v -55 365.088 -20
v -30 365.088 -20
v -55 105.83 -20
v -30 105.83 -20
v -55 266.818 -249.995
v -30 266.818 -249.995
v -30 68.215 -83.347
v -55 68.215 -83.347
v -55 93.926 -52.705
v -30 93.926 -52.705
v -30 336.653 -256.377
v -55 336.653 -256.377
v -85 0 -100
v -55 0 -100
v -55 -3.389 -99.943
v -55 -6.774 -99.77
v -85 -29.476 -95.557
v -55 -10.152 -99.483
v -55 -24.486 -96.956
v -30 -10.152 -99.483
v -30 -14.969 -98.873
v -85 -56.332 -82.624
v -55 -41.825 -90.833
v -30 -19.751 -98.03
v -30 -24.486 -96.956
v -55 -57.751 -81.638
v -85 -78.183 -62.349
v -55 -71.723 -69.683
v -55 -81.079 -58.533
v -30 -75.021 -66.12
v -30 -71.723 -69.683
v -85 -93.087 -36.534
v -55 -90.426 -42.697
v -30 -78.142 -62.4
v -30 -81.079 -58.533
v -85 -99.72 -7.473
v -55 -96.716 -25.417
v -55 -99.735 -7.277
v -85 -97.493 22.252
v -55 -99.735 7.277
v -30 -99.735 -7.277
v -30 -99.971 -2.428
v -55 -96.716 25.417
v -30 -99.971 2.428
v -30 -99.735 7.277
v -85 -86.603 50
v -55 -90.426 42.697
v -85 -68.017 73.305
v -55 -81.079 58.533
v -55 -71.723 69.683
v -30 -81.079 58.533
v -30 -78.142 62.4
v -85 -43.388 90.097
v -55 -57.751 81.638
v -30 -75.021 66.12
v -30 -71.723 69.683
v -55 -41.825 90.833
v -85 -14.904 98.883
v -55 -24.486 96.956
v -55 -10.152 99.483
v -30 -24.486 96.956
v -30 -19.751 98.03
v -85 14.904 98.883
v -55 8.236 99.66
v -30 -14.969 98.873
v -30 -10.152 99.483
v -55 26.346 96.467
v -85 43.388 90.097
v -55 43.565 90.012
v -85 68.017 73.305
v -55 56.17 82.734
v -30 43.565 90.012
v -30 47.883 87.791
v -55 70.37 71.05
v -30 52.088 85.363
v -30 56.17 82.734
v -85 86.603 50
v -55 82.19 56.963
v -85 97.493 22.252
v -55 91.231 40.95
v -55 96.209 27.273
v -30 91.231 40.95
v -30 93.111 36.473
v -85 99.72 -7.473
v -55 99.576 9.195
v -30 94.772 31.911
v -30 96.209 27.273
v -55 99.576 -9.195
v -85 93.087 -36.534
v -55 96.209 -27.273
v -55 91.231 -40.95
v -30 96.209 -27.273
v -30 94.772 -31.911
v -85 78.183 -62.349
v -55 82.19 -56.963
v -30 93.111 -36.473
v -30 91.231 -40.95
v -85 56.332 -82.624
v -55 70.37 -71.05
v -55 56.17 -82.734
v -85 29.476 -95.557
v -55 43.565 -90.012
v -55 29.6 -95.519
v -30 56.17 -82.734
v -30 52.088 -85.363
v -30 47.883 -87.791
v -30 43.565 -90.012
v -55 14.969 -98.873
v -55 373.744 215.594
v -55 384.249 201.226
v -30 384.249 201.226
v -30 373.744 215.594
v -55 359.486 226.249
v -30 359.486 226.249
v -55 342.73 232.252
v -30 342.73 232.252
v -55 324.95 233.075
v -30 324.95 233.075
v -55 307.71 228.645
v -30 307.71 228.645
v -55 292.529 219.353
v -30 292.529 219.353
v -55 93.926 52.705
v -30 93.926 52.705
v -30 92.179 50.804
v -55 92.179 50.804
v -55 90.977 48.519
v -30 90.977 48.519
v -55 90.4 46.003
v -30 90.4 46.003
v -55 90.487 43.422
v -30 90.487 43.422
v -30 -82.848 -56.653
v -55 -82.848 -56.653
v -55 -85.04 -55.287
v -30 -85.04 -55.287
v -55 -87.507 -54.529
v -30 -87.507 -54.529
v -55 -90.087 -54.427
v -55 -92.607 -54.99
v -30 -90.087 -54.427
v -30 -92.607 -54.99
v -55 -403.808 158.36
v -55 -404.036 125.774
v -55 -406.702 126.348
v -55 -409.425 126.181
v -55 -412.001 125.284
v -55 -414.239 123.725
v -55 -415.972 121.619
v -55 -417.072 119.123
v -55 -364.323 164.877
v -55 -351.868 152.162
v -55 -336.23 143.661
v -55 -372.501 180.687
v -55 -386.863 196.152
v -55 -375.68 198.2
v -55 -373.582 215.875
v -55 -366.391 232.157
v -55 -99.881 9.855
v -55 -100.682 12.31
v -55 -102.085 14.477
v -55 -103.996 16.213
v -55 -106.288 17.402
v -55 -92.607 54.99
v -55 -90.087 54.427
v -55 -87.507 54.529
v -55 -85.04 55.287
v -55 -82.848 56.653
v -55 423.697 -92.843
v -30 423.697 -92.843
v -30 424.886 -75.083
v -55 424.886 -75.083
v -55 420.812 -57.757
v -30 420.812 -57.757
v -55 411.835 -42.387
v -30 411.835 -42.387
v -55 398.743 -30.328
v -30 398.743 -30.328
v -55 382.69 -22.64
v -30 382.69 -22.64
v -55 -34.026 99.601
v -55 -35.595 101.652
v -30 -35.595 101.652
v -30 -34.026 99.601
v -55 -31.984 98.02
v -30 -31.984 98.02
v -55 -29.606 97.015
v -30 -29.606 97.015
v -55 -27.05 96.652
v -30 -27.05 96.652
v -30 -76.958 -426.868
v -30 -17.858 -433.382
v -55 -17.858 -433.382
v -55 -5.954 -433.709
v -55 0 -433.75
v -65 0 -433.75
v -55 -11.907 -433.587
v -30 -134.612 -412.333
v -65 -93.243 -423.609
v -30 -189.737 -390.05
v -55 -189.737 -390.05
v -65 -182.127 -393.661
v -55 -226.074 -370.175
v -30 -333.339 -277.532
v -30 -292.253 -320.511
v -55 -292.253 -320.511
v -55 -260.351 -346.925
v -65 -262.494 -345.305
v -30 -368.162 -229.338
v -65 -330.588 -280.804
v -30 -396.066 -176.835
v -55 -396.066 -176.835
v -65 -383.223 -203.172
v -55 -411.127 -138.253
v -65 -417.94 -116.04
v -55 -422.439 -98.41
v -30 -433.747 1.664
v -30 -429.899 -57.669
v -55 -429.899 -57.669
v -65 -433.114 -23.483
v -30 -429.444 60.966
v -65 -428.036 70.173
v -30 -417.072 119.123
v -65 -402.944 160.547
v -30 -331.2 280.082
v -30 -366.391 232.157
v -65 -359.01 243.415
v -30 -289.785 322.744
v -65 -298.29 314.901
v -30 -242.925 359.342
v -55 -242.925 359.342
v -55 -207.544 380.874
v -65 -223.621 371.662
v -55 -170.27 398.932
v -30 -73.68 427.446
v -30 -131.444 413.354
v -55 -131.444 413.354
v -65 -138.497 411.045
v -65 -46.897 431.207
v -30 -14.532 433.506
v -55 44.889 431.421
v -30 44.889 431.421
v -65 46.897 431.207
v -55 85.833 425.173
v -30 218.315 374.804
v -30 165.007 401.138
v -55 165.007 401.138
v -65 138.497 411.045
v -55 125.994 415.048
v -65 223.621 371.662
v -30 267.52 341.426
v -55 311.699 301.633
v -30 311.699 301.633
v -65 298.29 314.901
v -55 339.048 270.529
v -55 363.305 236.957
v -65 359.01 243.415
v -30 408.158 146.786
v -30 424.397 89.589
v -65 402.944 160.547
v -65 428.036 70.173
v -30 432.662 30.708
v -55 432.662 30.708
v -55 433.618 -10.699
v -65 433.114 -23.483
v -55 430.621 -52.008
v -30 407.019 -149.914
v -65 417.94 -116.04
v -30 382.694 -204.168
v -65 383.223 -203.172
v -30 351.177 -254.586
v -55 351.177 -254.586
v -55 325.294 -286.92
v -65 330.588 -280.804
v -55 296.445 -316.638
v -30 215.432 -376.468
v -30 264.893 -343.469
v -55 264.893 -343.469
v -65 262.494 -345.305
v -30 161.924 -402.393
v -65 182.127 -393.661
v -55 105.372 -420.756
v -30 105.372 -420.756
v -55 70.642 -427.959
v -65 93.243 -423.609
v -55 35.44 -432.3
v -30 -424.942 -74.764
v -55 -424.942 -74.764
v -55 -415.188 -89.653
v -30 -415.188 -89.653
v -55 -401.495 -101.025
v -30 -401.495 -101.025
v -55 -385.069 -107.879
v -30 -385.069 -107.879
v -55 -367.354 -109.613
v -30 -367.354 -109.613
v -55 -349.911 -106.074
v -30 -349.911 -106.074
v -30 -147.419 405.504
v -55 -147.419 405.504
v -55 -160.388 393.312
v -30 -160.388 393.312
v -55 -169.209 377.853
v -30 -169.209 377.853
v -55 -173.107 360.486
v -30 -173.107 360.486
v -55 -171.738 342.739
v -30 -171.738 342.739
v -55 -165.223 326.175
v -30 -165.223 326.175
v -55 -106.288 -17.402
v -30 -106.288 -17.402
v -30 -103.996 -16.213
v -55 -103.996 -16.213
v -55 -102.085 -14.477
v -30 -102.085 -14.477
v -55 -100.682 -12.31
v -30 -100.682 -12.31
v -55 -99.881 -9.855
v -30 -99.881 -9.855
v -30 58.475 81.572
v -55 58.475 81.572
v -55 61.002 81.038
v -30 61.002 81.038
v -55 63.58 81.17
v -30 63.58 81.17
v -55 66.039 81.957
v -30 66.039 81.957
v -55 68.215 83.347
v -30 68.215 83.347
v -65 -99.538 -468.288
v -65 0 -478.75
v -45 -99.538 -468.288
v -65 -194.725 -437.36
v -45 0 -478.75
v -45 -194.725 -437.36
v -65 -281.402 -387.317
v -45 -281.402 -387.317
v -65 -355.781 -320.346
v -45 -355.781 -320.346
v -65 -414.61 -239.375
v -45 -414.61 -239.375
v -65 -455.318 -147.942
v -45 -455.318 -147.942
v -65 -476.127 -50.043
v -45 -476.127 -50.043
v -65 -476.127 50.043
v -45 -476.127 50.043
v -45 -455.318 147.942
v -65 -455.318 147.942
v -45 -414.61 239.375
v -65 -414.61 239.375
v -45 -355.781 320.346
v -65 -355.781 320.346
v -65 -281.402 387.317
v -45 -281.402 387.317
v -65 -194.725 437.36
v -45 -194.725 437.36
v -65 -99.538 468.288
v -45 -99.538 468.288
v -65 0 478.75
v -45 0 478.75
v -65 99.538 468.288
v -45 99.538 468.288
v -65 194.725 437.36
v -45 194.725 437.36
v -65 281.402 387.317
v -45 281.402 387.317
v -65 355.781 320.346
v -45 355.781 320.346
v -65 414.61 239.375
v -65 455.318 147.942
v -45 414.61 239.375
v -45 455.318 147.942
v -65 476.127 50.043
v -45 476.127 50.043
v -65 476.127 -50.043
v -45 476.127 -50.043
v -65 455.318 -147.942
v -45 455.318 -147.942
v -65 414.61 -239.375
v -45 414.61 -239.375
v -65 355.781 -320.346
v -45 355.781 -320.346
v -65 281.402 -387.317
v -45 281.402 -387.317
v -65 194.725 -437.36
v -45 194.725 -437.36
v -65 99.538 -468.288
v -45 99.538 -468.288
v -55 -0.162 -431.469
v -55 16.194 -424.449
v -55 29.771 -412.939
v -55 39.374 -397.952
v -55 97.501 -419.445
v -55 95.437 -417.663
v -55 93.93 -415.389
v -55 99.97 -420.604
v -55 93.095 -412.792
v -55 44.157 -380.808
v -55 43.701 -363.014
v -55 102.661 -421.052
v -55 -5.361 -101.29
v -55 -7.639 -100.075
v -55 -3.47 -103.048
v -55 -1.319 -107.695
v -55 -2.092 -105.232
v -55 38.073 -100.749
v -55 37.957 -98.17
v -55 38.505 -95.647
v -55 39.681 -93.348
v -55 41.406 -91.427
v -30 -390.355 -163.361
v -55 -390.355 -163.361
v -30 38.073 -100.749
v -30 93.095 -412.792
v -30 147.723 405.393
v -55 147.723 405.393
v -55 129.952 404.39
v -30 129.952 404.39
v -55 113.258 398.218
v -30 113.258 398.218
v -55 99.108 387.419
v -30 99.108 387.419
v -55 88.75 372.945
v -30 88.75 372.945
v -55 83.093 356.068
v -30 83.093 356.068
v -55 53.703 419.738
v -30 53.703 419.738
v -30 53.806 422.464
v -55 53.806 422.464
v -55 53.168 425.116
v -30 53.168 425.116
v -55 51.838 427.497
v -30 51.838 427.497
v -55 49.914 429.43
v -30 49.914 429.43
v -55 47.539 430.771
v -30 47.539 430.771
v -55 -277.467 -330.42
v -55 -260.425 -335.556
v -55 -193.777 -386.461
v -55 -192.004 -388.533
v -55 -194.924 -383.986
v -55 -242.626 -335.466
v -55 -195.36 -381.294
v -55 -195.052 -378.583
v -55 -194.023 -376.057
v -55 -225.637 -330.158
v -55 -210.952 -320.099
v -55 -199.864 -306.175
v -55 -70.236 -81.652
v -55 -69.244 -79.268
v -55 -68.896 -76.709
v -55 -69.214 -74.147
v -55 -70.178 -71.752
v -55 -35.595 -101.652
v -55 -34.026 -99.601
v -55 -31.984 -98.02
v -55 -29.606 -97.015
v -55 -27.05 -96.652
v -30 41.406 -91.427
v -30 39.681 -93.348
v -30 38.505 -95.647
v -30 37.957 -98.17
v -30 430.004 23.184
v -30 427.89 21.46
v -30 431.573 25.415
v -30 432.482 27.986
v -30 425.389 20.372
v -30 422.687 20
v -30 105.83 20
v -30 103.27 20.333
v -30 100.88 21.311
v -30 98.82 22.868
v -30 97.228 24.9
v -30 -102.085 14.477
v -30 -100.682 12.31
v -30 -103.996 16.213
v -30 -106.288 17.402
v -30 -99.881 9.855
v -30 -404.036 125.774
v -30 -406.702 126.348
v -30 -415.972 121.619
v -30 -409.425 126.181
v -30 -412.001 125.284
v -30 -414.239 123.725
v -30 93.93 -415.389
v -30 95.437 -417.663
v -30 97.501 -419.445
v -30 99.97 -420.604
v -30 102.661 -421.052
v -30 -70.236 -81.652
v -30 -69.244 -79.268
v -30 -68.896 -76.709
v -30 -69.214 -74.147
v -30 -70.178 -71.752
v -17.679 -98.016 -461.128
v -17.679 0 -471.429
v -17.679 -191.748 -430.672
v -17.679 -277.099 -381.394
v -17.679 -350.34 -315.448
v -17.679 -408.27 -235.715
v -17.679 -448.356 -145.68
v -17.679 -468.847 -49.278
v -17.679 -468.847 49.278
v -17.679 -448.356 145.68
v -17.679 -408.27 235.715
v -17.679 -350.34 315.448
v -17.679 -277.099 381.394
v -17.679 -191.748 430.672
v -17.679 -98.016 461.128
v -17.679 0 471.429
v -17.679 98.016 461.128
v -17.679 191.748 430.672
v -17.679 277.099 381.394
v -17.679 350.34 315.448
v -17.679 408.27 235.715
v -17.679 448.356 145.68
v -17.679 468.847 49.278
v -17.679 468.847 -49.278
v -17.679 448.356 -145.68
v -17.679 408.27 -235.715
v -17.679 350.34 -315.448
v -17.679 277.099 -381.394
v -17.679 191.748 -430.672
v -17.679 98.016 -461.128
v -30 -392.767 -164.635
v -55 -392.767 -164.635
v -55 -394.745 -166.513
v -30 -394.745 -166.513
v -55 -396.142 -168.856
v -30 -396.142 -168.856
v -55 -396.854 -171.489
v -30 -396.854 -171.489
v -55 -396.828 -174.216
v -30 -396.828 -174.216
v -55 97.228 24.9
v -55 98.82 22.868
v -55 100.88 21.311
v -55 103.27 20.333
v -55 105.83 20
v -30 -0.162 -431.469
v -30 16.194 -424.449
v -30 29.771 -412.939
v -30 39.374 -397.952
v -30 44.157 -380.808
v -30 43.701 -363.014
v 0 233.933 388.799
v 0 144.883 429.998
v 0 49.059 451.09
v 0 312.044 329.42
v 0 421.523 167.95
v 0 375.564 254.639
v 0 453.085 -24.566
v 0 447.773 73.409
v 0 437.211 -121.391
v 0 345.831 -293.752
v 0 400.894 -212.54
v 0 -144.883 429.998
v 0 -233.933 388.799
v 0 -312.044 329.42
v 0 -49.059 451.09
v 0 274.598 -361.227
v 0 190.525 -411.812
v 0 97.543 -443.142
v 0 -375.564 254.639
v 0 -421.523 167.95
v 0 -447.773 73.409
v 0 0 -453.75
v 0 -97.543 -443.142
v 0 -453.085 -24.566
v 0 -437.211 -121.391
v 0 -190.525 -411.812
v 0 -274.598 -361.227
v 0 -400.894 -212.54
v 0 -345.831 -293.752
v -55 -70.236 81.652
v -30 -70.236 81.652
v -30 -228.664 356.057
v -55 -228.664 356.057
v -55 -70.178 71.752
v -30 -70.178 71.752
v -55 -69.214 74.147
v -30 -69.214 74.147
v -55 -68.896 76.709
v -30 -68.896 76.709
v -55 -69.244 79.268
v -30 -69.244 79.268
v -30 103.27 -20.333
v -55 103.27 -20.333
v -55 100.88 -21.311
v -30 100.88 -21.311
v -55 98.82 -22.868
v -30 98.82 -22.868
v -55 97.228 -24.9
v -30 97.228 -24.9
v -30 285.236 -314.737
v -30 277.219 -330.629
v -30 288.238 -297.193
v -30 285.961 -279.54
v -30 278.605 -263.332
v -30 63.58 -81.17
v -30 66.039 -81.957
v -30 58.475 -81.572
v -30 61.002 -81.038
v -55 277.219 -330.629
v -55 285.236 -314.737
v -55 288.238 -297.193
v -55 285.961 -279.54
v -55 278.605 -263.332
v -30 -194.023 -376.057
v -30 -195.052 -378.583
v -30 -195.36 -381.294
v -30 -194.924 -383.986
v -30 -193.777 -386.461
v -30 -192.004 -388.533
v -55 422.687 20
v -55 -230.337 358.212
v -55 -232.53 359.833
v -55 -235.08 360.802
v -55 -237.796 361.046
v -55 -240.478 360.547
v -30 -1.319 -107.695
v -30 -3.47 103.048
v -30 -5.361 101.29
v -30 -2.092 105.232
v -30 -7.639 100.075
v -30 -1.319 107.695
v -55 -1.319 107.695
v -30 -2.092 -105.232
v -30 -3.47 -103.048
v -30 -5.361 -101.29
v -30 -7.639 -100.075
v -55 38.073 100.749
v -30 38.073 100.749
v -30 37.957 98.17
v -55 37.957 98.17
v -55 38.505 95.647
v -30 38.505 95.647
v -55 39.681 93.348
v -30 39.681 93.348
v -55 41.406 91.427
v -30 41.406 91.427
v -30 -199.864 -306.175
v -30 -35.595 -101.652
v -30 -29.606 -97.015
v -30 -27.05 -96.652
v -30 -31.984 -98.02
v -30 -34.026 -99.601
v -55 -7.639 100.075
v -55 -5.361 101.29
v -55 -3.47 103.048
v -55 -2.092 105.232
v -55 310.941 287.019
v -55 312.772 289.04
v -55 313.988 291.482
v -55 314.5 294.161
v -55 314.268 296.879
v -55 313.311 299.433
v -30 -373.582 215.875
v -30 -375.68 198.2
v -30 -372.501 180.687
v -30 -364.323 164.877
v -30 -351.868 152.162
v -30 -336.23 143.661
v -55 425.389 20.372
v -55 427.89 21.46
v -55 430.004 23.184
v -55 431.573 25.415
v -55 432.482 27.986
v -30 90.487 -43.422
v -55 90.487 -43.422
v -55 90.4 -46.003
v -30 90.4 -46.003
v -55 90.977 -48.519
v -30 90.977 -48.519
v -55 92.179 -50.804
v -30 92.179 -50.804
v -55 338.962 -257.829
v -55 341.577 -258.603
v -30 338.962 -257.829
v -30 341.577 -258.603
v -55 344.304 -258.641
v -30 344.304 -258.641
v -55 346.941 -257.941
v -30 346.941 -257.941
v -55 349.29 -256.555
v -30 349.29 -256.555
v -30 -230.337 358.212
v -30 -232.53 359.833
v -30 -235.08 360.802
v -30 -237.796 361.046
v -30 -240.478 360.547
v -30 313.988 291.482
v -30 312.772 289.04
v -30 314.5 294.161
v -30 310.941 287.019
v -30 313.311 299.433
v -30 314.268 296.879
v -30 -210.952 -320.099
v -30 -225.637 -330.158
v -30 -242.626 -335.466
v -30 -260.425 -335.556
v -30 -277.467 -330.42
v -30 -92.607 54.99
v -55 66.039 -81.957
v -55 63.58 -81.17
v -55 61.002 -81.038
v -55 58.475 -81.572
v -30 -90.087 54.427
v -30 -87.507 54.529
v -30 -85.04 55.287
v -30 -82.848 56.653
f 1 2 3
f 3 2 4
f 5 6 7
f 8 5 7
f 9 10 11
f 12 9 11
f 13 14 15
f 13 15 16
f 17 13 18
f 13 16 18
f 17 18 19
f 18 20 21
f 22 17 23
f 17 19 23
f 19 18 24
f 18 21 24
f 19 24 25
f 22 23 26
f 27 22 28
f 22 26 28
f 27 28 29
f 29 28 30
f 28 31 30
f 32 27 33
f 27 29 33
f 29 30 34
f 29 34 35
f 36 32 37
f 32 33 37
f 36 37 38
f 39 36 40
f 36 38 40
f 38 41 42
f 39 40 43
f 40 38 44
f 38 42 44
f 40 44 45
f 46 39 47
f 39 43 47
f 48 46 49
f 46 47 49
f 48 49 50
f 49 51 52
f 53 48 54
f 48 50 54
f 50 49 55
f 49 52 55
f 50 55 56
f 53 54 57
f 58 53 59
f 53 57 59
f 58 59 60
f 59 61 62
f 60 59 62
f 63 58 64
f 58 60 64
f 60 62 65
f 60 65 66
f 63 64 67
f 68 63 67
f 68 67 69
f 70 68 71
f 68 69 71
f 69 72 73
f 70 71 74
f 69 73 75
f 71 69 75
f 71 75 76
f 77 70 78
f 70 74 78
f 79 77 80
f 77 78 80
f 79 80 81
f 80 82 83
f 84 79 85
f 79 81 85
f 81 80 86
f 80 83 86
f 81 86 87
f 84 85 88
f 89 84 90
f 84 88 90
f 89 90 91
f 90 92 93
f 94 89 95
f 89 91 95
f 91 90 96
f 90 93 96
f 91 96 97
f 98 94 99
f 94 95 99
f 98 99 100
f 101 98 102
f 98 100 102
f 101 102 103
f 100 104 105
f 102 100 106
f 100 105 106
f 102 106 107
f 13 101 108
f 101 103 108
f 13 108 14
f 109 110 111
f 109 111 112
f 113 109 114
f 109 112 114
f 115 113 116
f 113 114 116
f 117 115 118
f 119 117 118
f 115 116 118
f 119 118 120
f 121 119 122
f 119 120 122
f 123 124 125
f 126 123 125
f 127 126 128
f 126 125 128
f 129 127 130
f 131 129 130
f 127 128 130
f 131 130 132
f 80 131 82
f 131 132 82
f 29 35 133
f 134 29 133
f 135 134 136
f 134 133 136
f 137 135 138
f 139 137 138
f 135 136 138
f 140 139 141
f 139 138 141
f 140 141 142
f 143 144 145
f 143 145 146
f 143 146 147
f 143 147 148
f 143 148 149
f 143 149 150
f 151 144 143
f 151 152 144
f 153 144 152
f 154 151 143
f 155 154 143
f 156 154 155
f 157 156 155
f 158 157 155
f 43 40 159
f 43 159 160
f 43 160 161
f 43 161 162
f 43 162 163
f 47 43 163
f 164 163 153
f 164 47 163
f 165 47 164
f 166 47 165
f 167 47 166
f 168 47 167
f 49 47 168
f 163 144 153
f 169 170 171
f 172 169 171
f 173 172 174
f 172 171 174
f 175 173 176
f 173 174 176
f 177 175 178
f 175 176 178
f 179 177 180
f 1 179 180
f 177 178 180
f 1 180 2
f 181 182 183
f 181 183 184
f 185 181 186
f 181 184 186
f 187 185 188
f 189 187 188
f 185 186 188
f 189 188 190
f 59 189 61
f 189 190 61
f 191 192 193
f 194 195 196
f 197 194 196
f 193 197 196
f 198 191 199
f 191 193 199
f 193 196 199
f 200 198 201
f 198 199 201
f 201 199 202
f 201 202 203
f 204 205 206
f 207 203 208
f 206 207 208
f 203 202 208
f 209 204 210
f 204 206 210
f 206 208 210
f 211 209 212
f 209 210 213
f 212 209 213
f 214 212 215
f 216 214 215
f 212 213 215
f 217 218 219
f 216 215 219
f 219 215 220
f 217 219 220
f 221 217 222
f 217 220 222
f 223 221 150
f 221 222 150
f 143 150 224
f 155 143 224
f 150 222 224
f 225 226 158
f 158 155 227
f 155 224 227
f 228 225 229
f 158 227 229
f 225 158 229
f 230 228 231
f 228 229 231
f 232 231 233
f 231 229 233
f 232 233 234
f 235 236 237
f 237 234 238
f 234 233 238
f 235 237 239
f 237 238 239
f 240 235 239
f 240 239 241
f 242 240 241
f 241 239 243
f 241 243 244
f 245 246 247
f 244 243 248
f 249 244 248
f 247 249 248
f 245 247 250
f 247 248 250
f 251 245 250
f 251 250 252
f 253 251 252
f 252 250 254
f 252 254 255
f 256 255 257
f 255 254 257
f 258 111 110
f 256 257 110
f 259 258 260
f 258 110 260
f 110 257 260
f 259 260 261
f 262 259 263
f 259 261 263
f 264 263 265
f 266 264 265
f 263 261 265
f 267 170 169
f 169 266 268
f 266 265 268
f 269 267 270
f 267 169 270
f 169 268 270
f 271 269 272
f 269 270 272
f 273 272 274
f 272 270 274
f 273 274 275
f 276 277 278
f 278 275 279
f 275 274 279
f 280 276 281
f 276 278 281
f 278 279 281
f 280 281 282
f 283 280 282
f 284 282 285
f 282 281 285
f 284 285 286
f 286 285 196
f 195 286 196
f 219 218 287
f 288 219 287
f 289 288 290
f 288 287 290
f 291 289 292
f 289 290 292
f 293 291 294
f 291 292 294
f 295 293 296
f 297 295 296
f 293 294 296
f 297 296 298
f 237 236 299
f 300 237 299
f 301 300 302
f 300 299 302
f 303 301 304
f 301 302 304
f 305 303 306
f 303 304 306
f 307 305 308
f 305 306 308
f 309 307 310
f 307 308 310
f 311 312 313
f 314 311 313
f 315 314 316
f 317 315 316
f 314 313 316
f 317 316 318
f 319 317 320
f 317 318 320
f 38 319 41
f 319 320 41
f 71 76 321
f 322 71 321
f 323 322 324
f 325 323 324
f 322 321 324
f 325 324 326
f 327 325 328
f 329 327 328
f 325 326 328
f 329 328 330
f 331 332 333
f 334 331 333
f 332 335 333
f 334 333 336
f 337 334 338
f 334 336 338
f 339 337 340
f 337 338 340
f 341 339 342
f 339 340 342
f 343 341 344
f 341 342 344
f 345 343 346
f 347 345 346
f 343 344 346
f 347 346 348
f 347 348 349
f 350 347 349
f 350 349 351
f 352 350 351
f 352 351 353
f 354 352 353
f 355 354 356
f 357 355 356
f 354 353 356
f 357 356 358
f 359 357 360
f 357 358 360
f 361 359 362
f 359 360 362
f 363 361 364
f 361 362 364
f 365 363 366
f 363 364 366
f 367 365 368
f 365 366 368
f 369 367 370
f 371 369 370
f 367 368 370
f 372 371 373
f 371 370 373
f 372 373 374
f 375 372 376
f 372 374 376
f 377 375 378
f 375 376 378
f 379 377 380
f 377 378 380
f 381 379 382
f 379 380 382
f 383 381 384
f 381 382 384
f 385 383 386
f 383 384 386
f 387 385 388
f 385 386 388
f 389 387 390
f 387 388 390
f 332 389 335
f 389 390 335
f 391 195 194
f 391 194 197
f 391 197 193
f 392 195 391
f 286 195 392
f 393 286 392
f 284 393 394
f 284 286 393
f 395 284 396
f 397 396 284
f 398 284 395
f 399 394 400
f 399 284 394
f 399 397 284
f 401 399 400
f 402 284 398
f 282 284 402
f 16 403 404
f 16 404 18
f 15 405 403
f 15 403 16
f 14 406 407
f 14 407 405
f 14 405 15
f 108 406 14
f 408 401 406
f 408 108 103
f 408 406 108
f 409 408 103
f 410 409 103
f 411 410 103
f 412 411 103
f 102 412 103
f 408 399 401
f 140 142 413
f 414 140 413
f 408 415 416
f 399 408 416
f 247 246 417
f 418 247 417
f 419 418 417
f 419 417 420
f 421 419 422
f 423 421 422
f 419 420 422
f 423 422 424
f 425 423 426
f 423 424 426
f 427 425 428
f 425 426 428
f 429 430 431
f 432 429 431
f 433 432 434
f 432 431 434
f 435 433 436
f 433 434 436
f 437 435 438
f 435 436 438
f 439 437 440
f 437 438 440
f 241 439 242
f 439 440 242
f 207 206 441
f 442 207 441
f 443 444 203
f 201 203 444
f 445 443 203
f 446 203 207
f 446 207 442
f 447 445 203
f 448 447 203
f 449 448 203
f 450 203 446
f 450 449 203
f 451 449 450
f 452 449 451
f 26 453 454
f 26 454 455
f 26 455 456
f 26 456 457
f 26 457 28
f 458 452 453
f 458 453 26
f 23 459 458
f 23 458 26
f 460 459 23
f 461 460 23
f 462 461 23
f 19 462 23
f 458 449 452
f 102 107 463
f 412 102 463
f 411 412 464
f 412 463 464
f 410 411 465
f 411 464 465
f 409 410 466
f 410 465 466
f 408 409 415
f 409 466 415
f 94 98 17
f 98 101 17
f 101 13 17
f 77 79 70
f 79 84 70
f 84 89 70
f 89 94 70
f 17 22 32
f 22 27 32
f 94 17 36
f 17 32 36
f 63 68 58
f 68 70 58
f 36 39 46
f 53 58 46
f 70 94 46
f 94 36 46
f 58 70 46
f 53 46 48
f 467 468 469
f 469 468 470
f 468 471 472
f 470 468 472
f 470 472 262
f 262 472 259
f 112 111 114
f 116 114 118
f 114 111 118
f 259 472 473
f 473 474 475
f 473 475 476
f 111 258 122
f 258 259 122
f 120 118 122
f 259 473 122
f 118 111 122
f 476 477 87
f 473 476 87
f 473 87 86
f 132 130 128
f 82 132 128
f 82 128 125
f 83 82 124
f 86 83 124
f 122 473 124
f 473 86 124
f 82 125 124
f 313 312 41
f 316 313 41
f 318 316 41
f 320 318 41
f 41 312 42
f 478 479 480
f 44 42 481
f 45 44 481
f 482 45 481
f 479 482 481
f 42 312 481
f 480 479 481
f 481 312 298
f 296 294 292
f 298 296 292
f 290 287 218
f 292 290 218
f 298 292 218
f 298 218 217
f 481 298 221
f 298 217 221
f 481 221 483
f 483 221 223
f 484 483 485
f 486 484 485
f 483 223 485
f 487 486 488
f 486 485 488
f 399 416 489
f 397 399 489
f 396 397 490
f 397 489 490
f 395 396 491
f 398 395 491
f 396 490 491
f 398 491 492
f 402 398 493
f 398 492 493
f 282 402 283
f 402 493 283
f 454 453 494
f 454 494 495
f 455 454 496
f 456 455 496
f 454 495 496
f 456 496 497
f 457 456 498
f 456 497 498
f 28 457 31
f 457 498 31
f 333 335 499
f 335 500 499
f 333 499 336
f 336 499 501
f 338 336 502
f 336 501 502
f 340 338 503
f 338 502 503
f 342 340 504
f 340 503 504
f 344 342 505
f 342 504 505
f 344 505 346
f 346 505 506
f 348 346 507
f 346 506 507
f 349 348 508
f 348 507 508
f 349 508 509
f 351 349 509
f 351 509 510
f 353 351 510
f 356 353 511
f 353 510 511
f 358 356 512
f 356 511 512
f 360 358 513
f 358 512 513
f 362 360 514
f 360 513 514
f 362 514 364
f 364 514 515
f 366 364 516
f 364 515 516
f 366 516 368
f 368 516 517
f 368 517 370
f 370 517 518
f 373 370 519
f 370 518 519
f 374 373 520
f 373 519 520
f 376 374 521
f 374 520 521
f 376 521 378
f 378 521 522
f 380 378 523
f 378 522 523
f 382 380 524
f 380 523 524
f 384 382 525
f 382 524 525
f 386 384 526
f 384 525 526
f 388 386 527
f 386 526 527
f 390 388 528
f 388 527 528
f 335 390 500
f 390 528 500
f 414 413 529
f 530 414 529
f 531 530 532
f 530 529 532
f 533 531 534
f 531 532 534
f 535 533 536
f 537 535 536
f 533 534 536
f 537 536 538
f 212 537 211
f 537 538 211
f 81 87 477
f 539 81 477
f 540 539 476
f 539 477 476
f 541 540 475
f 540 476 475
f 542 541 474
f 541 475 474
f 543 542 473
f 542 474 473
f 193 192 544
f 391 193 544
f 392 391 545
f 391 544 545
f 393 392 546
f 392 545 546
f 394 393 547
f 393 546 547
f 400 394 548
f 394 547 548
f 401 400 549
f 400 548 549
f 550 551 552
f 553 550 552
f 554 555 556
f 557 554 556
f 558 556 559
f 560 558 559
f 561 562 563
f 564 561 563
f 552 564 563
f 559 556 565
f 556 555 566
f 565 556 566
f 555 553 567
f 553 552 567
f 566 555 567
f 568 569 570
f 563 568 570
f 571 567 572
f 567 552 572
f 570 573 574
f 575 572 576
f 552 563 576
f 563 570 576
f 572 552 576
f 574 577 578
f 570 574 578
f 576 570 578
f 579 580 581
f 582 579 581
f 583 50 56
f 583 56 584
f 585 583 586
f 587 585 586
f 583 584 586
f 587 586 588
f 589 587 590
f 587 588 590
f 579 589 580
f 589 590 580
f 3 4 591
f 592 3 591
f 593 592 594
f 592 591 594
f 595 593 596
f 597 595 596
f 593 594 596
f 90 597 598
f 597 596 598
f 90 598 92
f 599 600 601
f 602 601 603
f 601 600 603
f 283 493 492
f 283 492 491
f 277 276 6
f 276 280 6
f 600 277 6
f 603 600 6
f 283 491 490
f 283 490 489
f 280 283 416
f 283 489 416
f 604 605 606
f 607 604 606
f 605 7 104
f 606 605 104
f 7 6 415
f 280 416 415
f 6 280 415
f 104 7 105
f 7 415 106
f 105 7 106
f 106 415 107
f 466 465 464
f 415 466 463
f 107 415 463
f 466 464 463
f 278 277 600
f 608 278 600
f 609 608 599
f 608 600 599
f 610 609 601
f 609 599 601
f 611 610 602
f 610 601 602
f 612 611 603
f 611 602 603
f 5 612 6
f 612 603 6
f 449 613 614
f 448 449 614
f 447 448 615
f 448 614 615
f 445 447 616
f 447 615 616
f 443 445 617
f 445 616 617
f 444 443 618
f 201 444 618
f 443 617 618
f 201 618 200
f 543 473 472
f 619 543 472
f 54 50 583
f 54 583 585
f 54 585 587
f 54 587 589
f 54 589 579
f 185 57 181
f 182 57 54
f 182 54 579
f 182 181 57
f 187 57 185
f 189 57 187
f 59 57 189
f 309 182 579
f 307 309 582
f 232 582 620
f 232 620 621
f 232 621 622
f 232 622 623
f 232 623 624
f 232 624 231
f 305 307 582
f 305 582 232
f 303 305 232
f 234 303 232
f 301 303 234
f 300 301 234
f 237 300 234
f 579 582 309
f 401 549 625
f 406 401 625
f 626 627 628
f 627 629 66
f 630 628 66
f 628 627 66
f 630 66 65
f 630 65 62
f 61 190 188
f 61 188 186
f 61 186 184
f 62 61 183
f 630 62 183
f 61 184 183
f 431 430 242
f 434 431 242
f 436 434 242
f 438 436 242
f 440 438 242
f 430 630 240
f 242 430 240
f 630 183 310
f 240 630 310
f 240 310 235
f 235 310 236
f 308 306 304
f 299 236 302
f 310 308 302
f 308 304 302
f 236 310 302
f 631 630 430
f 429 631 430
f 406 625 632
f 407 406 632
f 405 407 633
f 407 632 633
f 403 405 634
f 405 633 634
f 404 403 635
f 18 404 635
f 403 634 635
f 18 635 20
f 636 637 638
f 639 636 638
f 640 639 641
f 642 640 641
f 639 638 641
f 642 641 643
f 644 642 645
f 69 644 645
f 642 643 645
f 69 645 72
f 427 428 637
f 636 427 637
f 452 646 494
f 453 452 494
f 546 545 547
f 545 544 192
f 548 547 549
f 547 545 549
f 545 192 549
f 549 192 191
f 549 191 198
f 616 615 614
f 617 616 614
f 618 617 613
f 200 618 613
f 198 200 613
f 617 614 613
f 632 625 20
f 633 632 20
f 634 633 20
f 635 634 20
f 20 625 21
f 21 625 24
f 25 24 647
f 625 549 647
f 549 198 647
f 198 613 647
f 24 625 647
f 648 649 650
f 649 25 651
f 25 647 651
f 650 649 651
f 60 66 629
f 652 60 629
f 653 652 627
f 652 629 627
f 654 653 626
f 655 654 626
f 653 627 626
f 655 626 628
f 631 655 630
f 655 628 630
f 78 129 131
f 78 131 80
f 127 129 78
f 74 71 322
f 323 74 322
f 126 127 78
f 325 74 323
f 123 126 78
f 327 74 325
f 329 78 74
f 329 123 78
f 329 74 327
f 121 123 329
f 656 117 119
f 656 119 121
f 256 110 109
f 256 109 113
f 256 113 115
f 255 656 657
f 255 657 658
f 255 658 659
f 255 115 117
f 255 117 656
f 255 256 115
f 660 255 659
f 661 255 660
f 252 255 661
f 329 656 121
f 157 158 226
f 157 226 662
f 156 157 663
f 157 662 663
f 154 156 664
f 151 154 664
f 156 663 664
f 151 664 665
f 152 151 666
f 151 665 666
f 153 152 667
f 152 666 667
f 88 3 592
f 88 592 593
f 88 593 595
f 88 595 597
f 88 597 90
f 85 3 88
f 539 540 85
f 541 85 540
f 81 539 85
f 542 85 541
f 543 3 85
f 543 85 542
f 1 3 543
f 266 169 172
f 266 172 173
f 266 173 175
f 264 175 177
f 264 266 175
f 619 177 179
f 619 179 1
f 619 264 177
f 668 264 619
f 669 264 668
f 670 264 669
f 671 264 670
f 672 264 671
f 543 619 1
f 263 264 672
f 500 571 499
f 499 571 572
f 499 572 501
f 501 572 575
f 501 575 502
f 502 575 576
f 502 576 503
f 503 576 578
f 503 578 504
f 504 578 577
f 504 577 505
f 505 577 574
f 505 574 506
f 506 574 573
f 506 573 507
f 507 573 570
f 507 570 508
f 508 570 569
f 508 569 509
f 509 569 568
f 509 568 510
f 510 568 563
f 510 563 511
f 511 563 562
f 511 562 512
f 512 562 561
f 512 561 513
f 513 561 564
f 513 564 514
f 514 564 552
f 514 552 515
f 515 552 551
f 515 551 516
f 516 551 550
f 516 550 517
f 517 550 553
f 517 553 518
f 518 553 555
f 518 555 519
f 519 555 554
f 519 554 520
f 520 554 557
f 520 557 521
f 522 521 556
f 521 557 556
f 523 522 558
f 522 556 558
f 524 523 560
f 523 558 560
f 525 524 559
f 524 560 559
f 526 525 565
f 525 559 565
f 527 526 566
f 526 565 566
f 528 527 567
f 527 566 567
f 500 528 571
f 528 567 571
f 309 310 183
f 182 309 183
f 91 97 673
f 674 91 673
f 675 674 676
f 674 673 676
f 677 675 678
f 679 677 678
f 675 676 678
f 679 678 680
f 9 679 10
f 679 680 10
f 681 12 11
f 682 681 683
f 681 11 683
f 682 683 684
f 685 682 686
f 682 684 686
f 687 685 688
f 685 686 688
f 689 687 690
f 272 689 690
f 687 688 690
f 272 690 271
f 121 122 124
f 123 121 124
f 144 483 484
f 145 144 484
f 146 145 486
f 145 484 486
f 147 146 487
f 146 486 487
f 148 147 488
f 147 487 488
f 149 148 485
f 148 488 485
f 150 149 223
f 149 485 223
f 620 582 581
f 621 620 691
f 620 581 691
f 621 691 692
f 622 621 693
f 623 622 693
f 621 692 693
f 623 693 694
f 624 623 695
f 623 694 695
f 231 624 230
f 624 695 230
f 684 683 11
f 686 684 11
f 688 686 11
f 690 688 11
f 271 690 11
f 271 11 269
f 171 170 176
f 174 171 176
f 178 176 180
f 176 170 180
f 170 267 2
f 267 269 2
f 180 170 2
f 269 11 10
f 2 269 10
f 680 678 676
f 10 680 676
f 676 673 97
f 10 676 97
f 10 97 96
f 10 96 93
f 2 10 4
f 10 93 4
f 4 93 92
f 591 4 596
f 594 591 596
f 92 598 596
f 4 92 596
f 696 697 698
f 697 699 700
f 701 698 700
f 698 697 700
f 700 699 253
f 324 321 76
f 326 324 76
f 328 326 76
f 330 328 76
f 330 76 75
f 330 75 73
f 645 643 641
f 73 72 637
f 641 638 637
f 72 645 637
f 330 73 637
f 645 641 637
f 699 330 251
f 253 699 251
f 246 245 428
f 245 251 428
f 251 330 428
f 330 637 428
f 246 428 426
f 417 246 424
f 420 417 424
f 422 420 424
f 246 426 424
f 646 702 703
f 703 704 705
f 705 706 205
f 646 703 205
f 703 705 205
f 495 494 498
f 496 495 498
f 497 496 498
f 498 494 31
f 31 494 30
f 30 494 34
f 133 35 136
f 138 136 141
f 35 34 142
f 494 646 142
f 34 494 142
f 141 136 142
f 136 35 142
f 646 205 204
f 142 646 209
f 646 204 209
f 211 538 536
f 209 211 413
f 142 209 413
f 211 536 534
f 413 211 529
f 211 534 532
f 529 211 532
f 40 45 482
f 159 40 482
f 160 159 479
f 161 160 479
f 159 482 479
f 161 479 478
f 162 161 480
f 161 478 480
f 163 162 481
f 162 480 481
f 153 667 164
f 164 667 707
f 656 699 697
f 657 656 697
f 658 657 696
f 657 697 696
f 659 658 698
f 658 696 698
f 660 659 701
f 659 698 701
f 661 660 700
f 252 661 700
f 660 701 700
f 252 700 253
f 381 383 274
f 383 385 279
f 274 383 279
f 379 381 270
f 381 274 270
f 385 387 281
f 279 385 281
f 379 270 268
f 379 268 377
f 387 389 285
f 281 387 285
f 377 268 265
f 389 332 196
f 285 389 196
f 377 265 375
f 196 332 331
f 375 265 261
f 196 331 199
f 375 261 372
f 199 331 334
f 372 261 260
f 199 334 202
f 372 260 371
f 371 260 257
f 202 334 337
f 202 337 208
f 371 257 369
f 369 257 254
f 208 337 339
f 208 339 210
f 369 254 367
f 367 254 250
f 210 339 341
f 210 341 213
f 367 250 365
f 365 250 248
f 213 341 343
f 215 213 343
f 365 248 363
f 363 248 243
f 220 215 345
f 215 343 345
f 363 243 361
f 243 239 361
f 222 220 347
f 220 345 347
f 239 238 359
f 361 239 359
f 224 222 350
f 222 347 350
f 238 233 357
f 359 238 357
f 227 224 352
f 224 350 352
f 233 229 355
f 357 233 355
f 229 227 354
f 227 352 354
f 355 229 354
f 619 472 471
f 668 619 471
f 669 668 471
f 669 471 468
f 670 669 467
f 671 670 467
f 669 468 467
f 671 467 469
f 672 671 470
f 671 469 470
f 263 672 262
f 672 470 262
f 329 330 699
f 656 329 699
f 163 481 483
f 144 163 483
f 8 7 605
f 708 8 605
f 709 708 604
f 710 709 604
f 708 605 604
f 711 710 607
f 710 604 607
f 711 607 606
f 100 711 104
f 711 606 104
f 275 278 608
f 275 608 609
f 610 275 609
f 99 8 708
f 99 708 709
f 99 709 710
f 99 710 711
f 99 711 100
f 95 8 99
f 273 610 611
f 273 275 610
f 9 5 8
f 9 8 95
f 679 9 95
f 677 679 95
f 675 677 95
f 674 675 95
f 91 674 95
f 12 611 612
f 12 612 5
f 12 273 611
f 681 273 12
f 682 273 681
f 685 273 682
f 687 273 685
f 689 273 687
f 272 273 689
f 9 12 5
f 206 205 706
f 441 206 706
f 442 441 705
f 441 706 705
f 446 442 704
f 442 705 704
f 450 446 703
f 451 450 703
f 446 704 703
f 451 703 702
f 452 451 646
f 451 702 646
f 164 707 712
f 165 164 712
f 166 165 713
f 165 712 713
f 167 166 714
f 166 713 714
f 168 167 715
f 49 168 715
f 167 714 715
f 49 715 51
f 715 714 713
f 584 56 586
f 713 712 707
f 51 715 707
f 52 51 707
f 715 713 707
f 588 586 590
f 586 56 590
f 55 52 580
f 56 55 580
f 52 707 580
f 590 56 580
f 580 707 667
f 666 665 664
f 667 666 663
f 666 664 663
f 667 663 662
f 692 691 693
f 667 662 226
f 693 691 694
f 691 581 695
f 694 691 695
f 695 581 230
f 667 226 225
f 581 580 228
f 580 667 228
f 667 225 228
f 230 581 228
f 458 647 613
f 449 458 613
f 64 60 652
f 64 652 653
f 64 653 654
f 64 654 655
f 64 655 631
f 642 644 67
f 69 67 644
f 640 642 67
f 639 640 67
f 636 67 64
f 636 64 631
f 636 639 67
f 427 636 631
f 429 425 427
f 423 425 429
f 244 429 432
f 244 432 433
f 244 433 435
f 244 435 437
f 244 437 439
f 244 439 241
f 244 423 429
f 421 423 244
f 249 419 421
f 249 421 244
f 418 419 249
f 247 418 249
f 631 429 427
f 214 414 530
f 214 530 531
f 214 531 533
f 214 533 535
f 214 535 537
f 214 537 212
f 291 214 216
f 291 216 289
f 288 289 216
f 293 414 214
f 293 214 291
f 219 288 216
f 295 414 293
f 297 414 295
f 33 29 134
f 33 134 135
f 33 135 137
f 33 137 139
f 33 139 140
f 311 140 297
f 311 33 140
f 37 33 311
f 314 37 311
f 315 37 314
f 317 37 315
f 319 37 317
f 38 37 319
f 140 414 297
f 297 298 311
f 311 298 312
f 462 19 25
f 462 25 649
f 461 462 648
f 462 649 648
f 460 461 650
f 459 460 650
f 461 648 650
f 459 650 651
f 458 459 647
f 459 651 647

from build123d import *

# Parameters (mm, degrees)
BOSS_EXTRUDE1_DEPTH = 25


with BuildPart() as part:
    # Sketch1 → Revolve1 (revolve)
    with BuildSketch(Plane(origin=(0, 0, 0), x_dir=(1, 0, 0), z_dir=(0, 1, 0))):
        Polygon((-85, 0), (-85, 100), (-30, 100), (-30, 433.75), (-65, 433.75), (-65, 478.75), (-45, 478.75), (-17.679491924, 471.429491924), (0, 453.75), (0, 0), align=None)
    revolve(axis=Axis((0, 0, 0), (-1, 0, 0)))

    # Sketch2 → Boss-Extrude1 (add)
    with BuildSketch(Plane.ZY.offset(30)):
        with BuildLine():
            Line((20, 105.830052443), (20, 422.686719096))
            ThreePointArc((20, 422.686719096), (23.183829742, 430.003810253), (30.707964602, 432.661626921))
            ThreePointArc((30.707964602, 432.661626921), (-31.38909354, 432.612745197), (-92.842809365, 423.697150391))
            ThreePointArc((-92.842809365, 423.697150391), (-42.387293117, 411.834770603), (-20, 365.087746302))
            Line((-20, 365.087746302), (-20, 105.830052443))
            ThreePointArc((-20, 105.830052443), (-22.022759648, 99.799825551), (-27.272727273, 96.209138584))
            ThreePointArc((-27.272727273, 96.209138584), (0, 100), (27.272727273, 96.209138584))
            ThreePointArc((27.272727273, 96.209138584), (22.022759648, 99.799825551), (20, 105.830052443))
        make_face()
        with BuildLine():
            Line((83.347135305, 68.214771395), (287.018674676, 310.94106015))
            ThreePointArc((287.018674676, 310.94106015), (294.160965293, 314.499750862), (301.633198614, 311.699335889))
            ThreePointArc((301.633198614, 311.699335889), (254.032671724, 351.577109888), (201.225560333, 384.24905513))
            ThreePointArc((201.225560333, 384.24905513), (232.25173743, 342.729764327), (219.352990909, 292.529191499))
            Line((219.352990909, 292.529191499), (52.70535758, 93.926275782))
            ThreePointArc((52.70535758, 93.926275782), (47.279678663, 90.60705882), (40.949921045, 91.231047163))
            ThreePointArc((40.949921045, 91.231047163), (64.278760969, 76.604444312), (82.734163396, 56.169904816))
            ThreePointArc((82.734163396, 56.169904816), (81.020503963, 62.295144755), (83.347135305, 68.214771395))
        make_face()
        with BuildLine():
            Line((107.6952197, -1.318959311), (419.738121614, 53.702623435))
            ThreePointArc((419.738121614, 53.702623435), (427.496915948, 51.837762766), (431.420906716, 44.889461442))
            ThreePointArc((431.420906716, 44.889461442), (420.58972663, 106.034637518), (401.138253978, 165.006556522))
            ThreePointArc((401.138253978, 165.006556522), (398.217598843, 113.257692306), (356.068279535, 83.092976894))
            Line((356.068279535, 83.092976894), (100.749292594, 38.073350809))
            ThreePointArc((100.749292594, 38.073350809), (94.459429872, 39.018242282), (90.011646197, 43.564934854))
            ThreePointArc((90.011646197, 43.564934854), (98.480775301, 17.364817767), (99.483364979, -10.151851674))
            ThreePointArc((99.483364979, -10.151851674), (102.107854032, -4.358126605), (107.6952197, -1.318959311))
        make_face()
        with BuildLine():
            Line((81.651513899, -70.235534297), (356.057436579, -228.663867624))
            ThreePointArc((356.057436579, -228.663867624), (360.802308533, -235.07969064), (359.341977855, -242.924690904))
            ThreePointArc((359.341977855, -242.924690904), (390.348174112, -189.122620191), (413.353900432, -131.444343727))
            ThreePointArc((413.353900432, -131.444343727), (377.853020062, -169.208912664), (326.175262908, -165.223365075))
            Line((326.175262908, -165.223365075), (101.651513899, -35.594518146))
            ThreePointArc((101.651513899, -35.594518146), (97.440564044, -30.827643459), (96.955921726, -24.485694643))
            ThreePointArc((96.955921726, -24.485694643), (86.602540378, -50), (69.683194454, -71.723443941))
            ThreePointArc((69.683194454, -71.723443941), (75.417804397, -68.972182092), (81.651513899, -70.235534297))
        make_face()
        with BuildLine():
            Line((17.402157289, -106.288122204), (125.773519831, -404.035993705))
            ThreePointArc((125.773519831, -404.035993705), (125.284291084, -412.000744176), (119.122943915, -417.071680569))
            ThreePointArc((119.122943915, -417.071680569), (177.45837269, -395.787302048), (232.156662956, -366.390974705))
            ThreePointArc((232.156662956, -366.390974705), (180.686813825, -372.500786851), (143.661215732, -336.229858273))
            Line((143.661215732, -336.229858273), (54.98986212, -92.607316471))
            ThreePointArc((54.98986212, -92.607316471), (54.828175369, -86.248932215), (58.533443935, -81.079195489))
            ThreePointArc((58.533443935, -81.079195489), (34.202014333, -93.969262079), (7.277482801, -99.73483967))
            ThreePointArc((7.277482801, -99.73483967), (13.438925908, -101.313387037), (17.402157289, -106.288122204))
        make_face()
        with BuildLine():
            Line((-54.98986212, -92.607316471), (-163.361224663, -390.355187972))
            ThreePointArc((-163.361224663, -390.355187972), (-168.855638543, -396.142070634), (-176.835039387, -396.066195661))
            ThreePointArc((-176.835039387, -396.066195661), (-118.466173544, -417.258706591), (-57.66925725, -429.899196636))
            ThreePointArc((-57.66925725, -429.899196636), (-101.024760711, -401.495402985), (-106.073510901, -349.910664006))
            Line((-106.073510901, -349.910664006), (-17.402157289, -106.288122204))
            ThreePointArc((-17.402157289, -106.288122204), (-13.438925908, -101.313387037), (-7.277482801, -99.73483967))
            ThreePointArc((-7.277482801, -99.73483967), (-34.202014333, -93.969262079), (-58.533443935, -81.079195489))
            ThreePointArc((-58.533443935, -81.079195489), (-54.828175369, -86.248932215), (-54.98986212, -92.607316471))
        make_face()
        with BuildLine():
            Line((-101.651513899, -35.594518146), (-376.057436579, -194.022851472))
            ThreePointArc((-376.057436579, -194.022851472), (-383.986138274, -194.924119613), (-390.049942457, -189.736936017))
            ThreePointArc((-390.049942457, -189.736936017), (-358.959080571, -243.490125006), (-320.511091067, -292.252806664))
            ThreePointArc((-320.511091067, -292.252806664), (-335.465726945, -242.625857938), (-306.175262908, -199.864381227))
            Line((-306.175262908, -199.864381227), (-81.651513899, -70.235534297))
            ThreePointArc((-81.651513899, -70.235534297), (-75.417804397, -68.972182092), (-69.683194454, -71.723443941))
            ThreePointArc((-69.683194454, -71.723443941), (-86.602540378, -50), (-96.955921726, -24.485694643))
            ThreePointArc((-96.955921726, -24.485694643), (-97.440564044, -30.827643459), (-101.651513899, -35.594518146))
        make_face()
        with BuildLine():
            Line((-100.749292594, 38.073350809), (-412.792194508, 93.094933555))
            ThreePointArc((-412.792194508, 93.094933555), (-419.445256376, 97.500993314), (-420.75614253, 105.37234468))
            ThreePointArc((-420.75614253, 105.37234468), (-431.491044414, 44.21019216), (-433.38222329, -17.858080426))
            ThreePointArc((-433.38222329, -17.858080426), (-412.938551255, 29.771022524), (-363.014206641, 43.700666774))
            Line((-363.014206641, 43.700666774), (-107.6952197, -1.318959311))
            ThreePointArc((-107.6952197, -1.318959311), (-102.107854032, -4.358126605), (-99.483364979, -10.151851674))
            ThreePointArc((-99.483364979, -10.151851674), (-98.480775301, 17.364817767), (-90.011646197, 43.564934854))
            ThreePointArc((-90.011646197, 43.564934854), (-94.459429872, 39.018242282), (-100.749292594, 38.073350809))
        make_face()
        with BuildLine():
            Line((-52.70535758, 93.926275782), (-256.376896951, 336.652564537))
            ThreePointArc((-256.376896951, 336.652564537), (-258.641277405, 344.304307868), (-254.585867329, 351.176734218))
            ThreePointArc((-254.585867329, 351.176734218), (-302.123553086, 311.224069073), (-343.468996728, 264.892640114))
            ThreePointArc((-343.468996728, 264.892640114), (-297.192838133, 288.237710679), (-249.994768634, 266.817687112))
            Line((-249.994768634, 266.817687112), (-83.347135305, 68.214771395))
            ThreePointArc((-83.347135305, 68.214771395), (-81.020503963, 62.295144755), (-82.734163396, 56.169904816))
            ThreePointArc((-82.734163396, 56.169904816), (-64.278760969, 76.604444312), (-40.949921045, 91.231047163))
            ThreePointArc((-40.949921045, 91.231047163), (-47.279678663, 90.60705882), (-52.70535758, 93.926275782))
        make_face()
    extrude(amount=BOSS_EXTRUDE1_DEPTH)


solid = part.part
